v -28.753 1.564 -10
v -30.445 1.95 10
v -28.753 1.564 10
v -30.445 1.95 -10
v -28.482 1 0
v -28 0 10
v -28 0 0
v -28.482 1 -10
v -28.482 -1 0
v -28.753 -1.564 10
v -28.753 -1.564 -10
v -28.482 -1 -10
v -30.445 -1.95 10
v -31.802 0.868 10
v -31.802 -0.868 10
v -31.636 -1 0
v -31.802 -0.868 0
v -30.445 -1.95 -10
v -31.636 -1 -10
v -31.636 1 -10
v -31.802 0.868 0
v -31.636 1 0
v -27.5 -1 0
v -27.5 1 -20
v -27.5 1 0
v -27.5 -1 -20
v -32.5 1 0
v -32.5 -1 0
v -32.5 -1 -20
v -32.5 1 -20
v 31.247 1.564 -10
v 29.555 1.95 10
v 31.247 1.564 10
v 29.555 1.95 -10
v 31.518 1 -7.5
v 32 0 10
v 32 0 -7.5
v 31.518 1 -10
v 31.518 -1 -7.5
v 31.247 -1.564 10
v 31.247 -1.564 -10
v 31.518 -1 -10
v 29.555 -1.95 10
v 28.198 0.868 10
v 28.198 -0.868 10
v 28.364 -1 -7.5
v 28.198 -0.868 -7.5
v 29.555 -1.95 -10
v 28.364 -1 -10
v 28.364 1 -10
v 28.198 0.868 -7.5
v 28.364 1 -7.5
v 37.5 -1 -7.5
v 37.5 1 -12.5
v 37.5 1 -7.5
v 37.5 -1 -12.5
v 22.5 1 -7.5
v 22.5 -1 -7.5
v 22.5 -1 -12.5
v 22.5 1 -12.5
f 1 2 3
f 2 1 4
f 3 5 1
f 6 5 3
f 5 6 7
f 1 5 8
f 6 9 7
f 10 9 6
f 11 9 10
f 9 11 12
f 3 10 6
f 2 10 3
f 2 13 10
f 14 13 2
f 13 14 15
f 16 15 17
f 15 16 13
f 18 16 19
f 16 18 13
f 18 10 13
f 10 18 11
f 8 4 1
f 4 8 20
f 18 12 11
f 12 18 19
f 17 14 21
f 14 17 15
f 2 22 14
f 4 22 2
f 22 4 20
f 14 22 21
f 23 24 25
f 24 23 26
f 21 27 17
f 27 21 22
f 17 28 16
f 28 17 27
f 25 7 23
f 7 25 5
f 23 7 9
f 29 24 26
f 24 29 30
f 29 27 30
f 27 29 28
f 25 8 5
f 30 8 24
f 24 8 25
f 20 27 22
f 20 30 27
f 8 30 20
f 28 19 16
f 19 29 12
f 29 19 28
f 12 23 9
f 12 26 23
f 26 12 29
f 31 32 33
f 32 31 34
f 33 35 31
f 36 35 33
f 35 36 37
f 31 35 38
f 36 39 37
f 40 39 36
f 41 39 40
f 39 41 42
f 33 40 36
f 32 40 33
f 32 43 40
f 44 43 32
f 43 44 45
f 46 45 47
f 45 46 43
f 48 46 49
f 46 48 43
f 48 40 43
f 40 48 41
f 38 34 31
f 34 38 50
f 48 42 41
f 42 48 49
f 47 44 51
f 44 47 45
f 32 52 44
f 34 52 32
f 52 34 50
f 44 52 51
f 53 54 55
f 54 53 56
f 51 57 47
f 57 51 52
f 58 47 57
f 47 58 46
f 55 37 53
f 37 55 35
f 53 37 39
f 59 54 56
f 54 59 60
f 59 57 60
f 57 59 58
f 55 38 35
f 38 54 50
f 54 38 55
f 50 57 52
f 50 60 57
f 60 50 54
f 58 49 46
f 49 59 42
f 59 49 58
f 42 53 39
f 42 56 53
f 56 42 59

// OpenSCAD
//
//   Code generated by ChatGPT for the query below
//
//   Can you write me OpenSCAD code to create a model of a knife and fork?
//
//   Created Jan 2023 by Jenny List, for a Hackaday article.
//


module knife() {
  union() {
    cylinder(r=2, h=20, center=true);
    translate([0, 0, -10]) cube([5, 2, 20], center=true);
  }
}

module fork() {
  union() {
    cylinder(r=2, h=20, center=true);
    translate([0, 0, -10]) cube([15, 2, 5], center=true);
  }
}

translate([-30, 0, 0]) knife();
translate([30, 0, 0]) fork();
